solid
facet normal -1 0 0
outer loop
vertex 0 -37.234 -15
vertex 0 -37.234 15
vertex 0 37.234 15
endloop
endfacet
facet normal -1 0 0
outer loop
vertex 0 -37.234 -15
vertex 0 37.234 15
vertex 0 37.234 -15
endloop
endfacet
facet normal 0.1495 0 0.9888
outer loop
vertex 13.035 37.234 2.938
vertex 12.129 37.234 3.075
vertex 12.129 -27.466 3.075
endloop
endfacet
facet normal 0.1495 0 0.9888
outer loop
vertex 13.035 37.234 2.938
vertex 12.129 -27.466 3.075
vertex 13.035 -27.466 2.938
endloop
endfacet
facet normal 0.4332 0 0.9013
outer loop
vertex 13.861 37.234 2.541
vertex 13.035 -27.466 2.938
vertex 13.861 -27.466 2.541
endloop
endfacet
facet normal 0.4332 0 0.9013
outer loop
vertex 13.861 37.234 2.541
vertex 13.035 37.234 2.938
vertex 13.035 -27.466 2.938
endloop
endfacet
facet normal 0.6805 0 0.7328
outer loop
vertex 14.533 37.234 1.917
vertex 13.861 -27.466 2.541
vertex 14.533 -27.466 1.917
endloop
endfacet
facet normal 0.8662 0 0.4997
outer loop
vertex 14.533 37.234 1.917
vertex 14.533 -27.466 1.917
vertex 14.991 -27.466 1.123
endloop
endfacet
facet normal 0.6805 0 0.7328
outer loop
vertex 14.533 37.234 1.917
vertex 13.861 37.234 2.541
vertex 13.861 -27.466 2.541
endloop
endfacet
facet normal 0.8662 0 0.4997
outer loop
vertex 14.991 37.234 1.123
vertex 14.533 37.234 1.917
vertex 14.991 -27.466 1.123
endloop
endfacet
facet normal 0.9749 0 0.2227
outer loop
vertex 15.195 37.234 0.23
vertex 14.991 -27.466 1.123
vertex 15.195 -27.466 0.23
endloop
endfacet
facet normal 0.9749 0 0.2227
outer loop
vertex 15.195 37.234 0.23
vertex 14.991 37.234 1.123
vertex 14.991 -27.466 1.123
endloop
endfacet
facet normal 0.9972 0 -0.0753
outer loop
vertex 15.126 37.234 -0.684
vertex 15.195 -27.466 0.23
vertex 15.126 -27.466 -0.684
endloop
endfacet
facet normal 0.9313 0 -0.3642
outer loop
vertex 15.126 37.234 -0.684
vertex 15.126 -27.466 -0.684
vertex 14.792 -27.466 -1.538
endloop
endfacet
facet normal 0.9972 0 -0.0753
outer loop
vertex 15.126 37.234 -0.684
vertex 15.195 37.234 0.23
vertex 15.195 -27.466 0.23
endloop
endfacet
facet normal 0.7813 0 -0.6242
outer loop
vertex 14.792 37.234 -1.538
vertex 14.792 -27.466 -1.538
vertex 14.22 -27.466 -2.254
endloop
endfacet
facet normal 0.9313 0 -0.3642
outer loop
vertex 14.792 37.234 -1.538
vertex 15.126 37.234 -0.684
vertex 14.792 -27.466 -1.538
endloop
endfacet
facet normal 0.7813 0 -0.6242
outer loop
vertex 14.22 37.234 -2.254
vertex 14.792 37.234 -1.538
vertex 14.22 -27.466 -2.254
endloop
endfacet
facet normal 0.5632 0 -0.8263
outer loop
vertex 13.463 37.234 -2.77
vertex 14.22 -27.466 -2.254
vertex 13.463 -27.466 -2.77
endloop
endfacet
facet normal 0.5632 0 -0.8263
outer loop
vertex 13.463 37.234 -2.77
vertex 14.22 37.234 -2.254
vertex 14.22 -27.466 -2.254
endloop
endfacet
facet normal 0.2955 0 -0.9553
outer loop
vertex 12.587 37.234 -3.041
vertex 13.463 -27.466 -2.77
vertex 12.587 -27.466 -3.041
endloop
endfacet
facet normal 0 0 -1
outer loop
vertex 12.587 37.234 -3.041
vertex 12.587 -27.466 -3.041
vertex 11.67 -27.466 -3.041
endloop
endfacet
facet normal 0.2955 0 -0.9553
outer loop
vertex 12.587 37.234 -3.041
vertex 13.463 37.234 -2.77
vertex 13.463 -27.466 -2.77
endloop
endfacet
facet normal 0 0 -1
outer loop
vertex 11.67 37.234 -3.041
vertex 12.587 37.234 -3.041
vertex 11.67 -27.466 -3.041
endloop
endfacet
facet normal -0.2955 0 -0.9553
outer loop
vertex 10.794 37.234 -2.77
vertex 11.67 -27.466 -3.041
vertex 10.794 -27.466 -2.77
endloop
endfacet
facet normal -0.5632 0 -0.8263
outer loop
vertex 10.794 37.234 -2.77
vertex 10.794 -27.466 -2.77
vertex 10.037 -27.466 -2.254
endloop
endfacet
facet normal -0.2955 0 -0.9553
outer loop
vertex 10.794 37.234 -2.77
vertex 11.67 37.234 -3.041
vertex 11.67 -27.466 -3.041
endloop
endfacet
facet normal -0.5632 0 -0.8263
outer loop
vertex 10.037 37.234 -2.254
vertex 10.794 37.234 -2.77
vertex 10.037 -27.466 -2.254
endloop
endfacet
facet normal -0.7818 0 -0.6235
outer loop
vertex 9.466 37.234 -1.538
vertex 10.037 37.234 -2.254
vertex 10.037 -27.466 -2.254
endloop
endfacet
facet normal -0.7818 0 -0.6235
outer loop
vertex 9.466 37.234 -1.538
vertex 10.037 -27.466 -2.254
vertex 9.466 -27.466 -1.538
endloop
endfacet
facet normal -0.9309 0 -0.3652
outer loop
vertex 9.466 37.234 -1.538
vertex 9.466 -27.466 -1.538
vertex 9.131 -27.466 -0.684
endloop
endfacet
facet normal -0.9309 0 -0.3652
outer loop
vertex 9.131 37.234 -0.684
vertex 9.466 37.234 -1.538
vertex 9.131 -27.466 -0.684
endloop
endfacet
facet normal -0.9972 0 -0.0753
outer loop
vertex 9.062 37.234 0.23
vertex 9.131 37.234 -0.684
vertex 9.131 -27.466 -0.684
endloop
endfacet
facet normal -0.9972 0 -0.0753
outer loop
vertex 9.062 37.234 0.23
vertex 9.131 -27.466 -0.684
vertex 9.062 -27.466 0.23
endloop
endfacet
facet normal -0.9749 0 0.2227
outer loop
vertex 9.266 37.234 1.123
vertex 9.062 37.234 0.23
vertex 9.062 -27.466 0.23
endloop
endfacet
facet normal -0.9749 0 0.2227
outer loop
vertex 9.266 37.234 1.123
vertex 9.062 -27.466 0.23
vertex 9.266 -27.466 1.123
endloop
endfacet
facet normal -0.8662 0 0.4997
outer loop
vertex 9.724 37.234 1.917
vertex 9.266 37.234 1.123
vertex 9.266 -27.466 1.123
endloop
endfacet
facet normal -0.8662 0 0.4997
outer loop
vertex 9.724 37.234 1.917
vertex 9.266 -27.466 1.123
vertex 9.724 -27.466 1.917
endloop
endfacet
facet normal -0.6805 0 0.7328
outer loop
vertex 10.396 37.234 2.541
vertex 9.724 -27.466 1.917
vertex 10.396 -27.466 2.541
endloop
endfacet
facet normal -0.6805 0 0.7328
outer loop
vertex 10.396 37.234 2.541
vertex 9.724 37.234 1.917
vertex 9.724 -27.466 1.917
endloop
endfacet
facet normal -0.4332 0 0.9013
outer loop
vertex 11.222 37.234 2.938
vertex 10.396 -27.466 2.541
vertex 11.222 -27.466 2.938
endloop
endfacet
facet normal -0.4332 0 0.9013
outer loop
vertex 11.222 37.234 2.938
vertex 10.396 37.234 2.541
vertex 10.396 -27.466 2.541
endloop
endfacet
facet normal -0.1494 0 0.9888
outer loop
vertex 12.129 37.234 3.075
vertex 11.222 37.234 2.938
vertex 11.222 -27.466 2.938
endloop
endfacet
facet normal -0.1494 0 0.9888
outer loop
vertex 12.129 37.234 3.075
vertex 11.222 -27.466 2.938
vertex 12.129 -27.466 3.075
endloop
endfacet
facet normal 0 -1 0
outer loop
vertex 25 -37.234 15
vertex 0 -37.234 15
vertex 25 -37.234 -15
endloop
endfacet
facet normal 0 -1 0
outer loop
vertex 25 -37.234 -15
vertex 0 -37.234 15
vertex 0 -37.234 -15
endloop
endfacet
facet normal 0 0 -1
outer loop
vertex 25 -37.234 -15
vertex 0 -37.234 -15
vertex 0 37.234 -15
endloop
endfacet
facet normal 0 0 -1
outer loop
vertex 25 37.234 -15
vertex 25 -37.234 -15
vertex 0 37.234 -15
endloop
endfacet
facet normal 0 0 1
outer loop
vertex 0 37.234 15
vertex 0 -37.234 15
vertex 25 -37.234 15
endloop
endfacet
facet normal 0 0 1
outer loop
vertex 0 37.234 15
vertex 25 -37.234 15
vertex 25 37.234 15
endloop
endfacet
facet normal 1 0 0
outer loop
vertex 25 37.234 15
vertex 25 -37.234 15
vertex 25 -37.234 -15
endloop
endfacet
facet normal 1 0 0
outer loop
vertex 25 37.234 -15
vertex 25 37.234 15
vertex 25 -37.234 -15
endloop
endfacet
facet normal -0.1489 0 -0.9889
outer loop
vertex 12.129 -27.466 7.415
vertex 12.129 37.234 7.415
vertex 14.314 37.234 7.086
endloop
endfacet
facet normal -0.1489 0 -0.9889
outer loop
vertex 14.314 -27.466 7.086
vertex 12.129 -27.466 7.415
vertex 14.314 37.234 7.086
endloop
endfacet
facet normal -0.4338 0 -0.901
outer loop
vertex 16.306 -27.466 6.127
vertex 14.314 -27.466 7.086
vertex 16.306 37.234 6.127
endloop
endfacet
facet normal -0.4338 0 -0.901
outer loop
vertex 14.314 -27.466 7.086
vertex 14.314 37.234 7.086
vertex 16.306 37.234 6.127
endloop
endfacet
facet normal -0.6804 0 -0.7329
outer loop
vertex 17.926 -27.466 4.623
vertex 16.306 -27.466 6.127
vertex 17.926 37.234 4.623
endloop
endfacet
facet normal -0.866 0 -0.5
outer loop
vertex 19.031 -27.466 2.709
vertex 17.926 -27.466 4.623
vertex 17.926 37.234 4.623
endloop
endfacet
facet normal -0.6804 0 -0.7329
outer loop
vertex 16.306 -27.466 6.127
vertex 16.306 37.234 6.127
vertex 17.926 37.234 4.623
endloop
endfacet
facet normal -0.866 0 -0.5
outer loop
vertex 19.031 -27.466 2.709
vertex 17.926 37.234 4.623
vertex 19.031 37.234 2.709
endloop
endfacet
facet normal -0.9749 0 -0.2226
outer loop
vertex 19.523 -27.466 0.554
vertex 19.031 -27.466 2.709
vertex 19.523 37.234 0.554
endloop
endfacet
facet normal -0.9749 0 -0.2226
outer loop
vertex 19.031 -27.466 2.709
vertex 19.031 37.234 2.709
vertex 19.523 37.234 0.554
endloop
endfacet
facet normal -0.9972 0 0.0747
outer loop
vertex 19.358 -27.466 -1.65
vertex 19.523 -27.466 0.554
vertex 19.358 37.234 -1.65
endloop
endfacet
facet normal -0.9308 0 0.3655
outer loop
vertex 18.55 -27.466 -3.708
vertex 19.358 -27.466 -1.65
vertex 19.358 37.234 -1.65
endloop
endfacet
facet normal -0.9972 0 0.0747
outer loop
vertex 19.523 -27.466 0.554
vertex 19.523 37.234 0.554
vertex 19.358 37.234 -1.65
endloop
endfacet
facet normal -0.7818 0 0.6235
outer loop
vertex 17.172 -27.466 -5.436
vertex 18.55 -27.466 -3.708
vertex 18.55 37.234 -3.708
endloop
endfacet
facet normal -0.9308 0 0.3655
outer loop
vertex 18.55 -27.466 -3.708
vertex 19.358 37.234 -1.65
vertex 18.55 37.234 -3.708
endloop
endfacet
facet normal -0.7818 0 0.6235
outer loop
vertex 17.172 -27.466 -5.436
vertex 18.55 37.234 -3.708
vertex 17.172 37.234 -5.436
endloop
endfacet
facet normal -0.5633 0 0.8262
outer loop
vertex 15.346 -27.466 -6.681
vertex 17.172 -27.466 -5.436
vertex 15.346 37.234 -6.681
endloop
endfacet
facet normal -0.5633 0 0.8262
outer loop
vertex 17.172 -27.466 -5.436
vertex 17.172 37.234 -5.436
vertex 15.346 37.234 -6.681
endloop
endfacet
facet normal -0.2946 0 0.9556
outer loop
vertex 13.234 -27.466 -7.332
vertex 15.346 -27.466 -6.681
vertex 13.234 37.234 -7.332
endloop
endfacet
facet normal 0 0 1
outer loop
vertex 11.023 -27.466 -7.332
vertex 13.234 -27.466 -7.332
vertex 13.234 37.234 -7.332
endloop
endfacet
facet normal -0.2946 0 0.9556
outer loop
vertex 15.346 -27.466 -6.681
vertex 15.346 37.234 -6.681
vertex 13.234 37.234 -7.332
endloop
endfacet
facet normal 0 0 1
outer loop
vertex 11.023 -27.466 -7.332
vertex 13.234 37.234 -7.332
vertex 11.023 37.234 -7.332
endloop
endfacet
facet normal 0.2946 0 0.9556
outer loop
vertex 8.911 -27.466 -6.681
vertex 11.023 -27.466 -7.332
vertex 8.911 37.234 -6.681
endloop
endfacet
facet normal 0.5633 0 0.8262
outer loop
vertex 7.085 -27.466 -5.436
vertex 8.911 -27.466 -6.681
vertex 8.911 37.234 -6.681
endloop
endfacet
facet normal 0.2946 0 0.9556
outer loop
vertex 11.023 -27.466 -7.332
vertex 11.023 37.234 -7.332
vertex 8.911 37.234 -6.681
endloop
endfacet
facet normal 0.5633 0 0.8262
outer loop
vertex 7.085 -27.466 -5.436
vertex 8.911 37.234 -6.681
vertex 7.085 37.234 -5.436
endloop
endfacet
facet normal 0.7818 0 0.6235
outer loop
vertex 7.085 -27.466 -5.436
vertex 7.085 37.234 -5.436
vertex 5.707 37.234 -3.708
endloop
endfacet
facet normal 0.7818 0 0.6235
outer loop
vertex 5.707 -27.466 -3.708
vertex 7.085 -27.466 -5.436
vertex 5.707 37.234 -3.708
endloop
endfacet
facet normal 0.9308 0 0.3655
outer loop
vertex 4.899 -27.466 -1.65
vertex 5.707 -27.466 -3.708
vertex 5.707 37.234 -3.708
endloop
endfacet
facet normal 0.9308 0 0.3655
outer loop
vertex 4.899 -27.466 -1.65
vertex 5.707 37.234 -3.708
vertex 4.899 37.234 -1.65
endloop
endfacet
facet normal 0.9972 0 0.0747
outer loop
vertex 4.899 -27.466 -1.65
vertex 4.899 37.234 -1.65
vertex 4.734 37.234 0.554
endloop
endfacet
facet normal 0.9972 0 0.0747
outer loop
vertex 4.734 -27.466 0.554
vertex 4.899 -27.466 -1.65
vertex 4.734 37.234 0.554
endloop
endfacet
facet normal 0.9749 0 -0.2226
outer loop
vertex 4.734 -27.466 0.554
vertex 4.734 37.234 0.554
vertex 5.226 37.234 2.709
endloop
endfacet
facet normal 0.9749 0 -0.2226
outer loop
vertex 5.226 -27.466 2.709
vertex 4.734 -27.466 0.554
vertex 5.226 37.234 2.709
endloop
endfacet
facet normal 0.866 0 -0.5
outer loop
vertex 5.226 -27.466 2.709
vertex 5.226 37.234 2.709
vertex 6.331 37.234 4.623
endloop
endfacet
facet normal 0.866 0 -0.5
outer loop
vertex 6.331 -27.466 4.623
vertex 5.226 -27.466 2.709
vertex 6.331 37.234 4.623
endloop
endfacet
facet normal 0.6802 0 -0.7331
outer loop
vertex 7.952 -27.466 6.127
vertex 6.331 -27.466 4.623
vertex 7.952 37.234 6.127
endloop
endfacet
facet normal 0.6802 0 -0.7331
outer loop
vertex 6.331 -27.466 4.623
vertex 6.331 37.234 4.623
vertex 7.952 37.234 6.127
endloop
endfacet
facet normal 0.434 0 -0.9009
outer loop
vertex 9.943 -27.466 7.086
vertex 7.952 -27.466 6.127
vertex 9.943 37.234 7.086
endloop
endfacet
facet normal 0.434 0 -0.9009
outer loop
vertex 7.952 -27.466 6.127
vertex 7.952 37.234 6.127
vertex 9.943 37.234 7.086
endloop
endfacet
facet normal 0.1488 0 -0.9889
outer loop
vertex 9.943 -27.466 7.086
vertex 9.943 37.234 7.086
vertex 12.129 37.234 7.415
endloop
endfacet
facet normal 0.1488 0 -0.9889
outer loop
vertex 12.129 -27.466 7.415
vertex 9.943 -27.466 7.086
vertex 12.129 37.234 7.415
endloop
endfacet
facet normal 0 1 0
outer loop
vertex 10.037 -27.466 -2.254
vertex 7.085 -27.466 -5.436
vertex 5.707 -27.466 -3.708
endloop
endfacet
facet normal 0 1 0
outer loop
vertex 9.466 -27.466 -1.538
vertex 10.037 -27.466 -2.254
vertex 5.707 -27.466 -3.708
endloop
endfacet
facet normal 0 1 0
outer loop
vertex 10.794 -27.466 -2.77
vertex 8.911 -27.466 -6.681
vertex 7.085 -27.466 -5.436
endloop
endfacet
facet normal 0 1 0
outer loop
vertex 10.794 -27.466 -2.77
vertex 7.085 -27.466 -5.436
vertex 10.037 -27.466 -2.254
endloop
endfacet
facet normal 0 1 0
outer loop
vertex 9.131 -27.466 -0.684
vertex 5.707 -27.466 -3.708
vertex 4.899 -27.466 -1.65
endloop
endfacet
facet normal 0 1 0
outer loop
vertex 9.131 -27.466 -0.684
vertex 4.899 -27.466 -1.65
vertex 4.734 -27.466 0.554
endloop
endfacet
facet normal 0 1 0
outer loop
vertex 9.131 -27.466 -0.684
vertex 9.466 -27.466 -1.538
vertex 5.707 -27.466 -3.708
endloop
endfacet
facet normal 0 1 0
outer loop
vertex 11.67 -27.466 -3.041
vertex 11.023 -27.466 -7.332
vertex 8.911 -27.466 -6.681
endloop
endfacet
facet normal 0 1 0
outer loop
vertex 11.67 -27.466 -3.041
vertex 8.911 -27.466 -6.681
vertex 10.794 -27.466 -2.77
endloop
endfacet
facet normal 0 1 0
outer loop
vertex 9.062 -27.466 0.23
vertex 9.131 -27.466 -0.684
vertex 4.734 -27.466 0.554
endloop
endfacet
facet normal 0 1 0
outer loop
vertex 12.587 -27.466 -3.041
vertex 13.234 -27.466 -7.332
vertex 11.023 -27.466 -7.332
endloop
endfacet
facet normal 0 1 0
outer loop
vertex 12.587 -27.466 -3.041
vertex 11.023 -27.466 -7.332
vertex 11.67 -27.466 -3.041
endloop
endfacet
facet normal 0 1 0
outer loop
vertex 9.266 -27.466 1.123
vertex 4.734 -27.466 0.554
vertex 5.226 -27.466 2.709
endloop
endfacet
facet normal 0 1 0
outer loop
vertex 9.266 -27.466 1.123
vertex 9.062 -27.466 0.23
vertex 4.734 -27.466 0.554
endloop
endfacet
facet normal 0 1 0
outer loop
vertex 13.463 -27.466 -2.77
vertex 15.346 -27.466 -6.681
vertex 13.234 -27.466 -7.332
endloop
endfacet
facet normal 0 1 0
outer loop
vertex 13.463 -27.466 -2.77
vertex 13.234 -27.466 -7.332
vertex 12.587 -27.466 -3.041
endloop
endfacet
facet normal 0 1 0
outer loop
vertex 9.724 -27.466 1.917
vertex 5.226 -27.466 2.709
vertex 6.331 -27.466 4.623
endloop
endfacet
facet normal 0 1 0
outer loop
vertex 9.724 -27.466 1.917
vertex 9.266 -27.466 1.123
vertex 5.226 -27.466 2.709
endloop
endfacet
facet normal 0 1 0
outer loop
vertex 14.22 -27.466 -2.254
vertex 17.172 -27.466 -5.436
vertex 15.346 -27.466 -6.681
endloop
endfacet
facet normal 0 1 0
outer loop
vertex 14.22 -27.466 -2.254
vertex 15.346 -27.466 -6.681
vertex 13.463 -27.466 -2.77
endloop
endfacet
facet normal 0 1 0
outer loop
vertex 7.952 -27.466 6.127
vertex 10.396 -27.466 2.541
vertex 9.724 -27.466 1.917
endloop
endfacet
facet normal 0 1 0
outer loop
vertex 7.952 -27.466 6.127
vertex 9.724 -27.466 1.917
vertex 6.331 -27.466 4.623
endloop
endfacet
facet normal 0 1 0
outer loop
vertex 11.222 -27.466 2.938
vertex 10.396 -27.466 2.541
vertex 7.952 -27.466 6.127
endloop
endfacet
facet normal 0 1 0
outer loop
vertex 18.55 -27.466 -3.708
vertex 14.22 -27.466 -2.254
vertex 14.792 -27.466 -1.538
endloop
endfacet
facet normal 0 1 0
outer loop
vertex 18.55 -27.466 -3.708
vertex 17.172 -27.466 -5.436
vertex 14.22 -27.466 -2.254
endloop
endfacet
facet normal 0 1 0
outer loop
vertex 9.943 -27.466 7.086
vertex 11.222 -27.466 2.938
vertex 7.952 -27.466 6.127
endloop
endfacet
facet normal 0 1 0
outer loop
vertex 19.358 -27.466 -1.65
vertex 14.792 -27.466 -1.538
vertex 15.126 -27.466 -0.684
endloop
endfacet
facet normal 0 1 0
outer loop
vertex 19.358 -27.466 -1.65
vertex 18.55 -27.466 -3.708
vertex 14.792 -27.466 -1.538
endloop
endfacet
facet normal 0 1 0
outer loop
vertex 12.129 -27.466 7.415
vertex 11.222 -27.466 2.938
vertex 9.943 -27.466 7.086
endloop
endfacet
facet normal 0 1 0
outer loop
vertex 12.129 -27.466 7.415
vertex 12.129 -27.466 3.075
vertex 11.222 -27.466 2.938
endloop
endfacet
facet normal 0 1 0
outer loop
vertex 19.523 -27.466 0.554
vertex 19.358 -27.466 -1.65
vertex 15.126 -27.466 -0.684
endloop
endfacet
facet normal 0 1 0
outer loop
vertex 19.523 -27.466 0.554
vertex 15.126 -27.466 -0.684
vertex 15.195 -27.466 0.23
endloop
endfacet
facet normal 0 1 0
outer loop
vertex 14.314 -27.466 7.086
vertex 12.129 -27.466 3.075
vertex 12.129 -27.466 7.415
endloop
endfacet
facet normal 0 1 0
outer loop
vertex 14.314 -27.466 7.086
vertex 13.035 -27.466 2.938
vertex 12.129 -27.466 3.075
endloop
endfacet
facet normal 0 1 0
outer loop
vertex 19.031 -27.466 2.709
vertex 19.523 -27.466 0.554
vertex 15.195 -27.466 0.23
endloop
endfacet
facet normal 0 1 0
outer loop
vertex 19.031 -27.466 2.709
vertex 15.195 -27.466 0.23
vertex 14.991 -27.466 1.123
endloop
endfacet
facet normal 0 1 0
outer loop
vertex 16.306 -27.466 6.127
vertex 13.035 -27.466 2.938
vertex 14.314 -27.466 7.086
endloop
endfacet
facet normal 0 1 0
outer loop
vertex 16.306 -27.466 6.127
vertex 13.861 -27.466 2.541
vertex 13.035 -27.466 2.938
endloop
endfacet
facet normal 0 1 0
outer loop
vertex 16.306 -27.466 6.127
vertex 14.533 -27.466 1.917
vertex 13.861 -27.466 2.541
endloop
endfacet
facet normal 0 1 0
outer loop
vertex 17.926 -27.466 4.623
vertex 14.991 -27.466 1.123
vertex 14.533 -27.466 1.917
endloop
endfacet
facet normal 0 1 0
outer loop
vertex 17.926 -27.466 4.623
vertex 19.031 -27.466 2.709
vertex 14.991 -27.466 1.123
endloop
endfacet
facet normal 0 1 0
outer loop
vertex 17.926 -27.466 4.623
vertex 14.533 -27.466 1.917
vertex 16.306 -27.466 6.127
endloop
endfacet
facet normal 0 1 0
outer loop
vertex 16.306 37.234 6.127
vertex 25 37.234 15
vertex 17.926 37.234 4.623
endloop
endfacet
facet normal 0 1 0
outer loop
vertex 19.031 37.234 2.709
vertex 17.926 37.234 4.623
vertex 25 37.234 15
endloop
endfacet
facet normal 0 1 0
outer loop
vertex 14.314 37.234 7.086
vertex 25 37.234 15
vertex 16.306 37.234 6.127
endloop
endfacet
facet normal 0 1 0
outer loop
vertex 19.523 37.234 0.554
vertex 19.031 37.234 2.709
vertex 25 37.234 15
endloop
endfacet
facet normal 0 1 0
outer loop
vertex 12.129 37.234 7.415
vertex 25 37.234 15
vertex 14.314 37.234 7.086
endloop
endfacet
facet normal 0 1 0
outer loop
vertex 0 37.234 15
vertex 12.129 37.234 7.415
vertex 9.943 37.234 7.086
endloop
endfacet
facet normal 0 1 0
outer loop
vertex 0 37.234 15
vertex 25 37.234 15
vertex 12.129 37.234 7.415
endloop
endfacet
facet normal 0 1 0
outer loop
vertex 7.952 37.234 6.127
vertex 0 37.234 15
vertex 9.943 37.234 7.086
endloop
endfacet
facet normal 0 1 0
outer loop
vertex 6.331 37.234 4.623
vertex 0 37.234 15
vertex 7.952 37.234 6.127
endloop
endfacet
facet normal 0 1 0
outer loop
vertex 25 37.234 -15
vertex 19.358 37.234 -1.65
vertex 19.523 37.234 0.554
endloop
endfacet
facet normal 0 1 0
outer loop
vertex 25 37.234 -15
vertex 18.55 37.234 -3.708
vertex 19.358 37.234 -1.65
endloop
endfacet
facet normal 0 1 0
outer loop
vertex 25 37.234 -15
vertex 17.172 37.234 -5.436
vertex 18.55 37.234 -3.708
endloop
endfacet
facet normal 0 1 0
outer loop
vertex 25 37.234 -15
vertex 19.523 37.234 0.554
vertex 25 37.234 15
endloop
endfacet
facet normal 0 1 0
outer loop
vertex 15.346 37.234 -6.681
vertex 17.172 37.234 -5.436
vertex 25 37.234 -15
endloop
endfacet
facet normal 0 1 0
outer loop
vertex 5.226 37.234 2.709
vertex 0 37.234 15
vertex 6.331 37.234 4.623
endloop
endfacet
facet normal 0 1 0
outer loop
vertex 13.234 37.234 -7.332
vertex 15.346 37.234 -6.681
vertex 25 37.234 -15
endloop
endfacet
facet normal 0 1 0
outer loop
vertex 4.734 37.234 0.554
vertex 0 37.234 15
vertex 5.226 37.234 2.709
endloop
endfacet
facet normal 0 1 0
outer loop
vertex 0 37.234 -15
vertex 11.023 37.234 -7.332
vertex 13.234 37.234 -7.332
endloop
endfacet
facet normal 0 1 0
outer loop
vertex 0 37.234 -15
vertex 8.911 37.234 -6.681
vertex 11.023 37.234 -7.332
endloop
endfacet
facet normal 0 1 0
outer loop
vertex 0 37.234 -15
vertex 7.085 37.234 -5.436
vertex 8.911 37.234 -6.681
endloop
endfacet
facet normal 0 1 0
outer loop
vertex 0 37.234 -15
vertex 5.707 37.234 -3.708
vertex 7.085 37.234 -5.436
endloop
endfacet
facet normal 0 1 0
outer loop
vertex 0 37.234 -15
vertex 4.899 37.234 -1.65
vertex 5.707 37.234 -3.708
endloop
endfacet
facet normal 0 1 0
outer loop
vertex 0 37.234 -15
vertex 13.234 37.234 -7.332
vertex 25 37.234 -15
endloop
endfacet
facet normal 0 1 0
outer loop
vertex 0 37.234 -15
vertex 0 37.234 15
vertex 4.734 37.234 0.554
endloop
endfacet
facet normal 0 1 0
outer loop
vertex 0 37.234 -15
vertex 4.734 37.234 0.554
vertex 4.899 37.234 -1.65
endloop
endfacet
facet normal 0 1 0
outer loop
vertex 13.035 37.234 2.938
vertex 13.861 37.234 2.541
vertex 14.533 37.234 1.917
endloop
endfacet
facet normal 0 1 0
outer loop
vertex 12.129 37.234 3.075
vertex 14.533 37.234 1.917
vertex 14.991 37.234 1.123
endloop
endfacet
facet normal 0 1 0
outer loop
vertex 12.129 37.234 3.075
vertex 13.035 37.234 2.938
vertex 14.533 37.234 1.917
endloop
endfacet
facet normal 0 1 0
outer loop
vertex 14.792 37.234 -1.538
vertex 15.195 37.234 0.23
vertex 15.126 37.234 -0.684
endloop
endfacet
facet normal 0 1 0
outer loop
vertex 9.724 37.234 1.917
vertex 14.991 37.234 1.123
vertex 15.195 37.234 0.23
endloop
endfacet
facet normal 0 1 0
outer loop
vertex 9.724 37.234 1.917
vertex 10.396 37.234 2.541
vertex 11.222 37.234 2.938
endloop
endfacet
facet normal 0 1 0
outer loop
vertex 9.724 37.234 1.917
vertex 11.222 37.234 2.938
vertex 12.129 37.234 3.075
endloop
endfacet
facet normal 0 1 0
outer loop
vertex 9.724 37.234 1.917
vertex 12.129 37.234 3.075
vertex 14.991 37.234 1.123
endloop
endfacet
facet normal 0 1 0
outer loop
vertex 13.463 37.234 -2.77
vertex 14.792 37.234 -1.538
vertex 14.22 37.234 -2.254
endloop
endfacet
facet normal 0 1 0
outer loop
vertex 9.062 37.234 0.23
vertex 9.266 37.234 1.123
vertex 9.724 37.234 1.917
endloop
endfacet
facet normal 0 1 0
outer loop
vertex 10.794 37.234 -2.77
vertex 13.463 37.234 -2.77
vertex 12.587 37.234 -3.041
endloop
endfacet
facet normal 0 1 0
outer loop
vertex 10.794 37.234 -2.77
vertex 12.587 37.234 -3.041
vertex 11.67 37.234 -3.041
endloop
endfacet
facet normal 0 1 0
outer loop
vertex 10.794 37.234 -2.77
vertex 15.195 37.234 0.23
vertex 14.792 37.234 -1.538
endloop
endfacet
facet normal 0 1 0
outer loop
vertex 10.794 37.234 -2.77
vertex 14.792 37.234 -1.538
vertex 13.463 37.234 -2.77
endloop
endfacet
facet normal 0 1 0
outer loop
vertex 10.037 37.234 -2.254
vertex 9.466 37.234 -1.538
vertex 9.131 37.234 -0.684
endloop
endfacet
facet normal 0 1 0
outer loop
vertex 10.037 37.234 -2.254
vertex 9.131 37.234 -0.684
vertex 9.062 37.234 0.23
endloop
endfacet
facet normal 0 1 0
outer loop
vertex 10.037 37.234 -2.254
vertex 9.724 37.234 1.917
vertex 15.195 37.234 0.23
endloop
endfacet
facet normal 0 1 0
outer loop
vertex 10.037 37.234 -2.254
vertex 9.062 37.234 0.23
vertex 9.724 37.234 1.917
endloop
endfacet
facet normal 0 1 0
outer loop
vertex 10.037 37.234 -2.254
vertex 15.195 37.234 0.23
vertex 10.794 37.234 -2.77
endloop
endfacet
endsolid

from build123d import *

# Parameters (mm, degrees)
SKETCH1_W           = 30
SKETCH1_H           = 74.468085106
BOSS_EXTRUDE1_DEPTH = 25
SKETCH2_R           = 7.415
SKETCH2_R_2         = 3.075
CUT_EXTRUDE1_DEPTH  = 64.7


with BuildPart() as part:
    # Sketch1 → Boss-Extrude1 (new body)
    with BuildSketch(Plane(origin=(0, 0, 0), x_dir=(0, 0, -1), z_dir=(1, 0, 0))):
        Rectangle(SKETCH1_W, SKETCH1_H)
    extrude(amount=BOSS_EXTRUDE1_DEPTH)

    # Sketch2 → Cut-Extrude1 (cut)
    with BuildSketch(Plane(origin=(0, 37.234042553, 0), x_dir=(1, 0, 0), z_dir=(0, 1, 0))):
        with Locations(Location((12.128550828, 0, 0), (0, 0, 270))):
            Circle(SKETCH2_R)
        with Locations(Location((12.128550828, 0, 0), (0, 0, 270))):
            Circle(SKETCH2_R_2, mode=Mode.SUBTRACT)
    extrude(amount=-CUT_EXTRUDE1_DEPTH, mode=Mode.SUBTRACT)


solid = part.part
